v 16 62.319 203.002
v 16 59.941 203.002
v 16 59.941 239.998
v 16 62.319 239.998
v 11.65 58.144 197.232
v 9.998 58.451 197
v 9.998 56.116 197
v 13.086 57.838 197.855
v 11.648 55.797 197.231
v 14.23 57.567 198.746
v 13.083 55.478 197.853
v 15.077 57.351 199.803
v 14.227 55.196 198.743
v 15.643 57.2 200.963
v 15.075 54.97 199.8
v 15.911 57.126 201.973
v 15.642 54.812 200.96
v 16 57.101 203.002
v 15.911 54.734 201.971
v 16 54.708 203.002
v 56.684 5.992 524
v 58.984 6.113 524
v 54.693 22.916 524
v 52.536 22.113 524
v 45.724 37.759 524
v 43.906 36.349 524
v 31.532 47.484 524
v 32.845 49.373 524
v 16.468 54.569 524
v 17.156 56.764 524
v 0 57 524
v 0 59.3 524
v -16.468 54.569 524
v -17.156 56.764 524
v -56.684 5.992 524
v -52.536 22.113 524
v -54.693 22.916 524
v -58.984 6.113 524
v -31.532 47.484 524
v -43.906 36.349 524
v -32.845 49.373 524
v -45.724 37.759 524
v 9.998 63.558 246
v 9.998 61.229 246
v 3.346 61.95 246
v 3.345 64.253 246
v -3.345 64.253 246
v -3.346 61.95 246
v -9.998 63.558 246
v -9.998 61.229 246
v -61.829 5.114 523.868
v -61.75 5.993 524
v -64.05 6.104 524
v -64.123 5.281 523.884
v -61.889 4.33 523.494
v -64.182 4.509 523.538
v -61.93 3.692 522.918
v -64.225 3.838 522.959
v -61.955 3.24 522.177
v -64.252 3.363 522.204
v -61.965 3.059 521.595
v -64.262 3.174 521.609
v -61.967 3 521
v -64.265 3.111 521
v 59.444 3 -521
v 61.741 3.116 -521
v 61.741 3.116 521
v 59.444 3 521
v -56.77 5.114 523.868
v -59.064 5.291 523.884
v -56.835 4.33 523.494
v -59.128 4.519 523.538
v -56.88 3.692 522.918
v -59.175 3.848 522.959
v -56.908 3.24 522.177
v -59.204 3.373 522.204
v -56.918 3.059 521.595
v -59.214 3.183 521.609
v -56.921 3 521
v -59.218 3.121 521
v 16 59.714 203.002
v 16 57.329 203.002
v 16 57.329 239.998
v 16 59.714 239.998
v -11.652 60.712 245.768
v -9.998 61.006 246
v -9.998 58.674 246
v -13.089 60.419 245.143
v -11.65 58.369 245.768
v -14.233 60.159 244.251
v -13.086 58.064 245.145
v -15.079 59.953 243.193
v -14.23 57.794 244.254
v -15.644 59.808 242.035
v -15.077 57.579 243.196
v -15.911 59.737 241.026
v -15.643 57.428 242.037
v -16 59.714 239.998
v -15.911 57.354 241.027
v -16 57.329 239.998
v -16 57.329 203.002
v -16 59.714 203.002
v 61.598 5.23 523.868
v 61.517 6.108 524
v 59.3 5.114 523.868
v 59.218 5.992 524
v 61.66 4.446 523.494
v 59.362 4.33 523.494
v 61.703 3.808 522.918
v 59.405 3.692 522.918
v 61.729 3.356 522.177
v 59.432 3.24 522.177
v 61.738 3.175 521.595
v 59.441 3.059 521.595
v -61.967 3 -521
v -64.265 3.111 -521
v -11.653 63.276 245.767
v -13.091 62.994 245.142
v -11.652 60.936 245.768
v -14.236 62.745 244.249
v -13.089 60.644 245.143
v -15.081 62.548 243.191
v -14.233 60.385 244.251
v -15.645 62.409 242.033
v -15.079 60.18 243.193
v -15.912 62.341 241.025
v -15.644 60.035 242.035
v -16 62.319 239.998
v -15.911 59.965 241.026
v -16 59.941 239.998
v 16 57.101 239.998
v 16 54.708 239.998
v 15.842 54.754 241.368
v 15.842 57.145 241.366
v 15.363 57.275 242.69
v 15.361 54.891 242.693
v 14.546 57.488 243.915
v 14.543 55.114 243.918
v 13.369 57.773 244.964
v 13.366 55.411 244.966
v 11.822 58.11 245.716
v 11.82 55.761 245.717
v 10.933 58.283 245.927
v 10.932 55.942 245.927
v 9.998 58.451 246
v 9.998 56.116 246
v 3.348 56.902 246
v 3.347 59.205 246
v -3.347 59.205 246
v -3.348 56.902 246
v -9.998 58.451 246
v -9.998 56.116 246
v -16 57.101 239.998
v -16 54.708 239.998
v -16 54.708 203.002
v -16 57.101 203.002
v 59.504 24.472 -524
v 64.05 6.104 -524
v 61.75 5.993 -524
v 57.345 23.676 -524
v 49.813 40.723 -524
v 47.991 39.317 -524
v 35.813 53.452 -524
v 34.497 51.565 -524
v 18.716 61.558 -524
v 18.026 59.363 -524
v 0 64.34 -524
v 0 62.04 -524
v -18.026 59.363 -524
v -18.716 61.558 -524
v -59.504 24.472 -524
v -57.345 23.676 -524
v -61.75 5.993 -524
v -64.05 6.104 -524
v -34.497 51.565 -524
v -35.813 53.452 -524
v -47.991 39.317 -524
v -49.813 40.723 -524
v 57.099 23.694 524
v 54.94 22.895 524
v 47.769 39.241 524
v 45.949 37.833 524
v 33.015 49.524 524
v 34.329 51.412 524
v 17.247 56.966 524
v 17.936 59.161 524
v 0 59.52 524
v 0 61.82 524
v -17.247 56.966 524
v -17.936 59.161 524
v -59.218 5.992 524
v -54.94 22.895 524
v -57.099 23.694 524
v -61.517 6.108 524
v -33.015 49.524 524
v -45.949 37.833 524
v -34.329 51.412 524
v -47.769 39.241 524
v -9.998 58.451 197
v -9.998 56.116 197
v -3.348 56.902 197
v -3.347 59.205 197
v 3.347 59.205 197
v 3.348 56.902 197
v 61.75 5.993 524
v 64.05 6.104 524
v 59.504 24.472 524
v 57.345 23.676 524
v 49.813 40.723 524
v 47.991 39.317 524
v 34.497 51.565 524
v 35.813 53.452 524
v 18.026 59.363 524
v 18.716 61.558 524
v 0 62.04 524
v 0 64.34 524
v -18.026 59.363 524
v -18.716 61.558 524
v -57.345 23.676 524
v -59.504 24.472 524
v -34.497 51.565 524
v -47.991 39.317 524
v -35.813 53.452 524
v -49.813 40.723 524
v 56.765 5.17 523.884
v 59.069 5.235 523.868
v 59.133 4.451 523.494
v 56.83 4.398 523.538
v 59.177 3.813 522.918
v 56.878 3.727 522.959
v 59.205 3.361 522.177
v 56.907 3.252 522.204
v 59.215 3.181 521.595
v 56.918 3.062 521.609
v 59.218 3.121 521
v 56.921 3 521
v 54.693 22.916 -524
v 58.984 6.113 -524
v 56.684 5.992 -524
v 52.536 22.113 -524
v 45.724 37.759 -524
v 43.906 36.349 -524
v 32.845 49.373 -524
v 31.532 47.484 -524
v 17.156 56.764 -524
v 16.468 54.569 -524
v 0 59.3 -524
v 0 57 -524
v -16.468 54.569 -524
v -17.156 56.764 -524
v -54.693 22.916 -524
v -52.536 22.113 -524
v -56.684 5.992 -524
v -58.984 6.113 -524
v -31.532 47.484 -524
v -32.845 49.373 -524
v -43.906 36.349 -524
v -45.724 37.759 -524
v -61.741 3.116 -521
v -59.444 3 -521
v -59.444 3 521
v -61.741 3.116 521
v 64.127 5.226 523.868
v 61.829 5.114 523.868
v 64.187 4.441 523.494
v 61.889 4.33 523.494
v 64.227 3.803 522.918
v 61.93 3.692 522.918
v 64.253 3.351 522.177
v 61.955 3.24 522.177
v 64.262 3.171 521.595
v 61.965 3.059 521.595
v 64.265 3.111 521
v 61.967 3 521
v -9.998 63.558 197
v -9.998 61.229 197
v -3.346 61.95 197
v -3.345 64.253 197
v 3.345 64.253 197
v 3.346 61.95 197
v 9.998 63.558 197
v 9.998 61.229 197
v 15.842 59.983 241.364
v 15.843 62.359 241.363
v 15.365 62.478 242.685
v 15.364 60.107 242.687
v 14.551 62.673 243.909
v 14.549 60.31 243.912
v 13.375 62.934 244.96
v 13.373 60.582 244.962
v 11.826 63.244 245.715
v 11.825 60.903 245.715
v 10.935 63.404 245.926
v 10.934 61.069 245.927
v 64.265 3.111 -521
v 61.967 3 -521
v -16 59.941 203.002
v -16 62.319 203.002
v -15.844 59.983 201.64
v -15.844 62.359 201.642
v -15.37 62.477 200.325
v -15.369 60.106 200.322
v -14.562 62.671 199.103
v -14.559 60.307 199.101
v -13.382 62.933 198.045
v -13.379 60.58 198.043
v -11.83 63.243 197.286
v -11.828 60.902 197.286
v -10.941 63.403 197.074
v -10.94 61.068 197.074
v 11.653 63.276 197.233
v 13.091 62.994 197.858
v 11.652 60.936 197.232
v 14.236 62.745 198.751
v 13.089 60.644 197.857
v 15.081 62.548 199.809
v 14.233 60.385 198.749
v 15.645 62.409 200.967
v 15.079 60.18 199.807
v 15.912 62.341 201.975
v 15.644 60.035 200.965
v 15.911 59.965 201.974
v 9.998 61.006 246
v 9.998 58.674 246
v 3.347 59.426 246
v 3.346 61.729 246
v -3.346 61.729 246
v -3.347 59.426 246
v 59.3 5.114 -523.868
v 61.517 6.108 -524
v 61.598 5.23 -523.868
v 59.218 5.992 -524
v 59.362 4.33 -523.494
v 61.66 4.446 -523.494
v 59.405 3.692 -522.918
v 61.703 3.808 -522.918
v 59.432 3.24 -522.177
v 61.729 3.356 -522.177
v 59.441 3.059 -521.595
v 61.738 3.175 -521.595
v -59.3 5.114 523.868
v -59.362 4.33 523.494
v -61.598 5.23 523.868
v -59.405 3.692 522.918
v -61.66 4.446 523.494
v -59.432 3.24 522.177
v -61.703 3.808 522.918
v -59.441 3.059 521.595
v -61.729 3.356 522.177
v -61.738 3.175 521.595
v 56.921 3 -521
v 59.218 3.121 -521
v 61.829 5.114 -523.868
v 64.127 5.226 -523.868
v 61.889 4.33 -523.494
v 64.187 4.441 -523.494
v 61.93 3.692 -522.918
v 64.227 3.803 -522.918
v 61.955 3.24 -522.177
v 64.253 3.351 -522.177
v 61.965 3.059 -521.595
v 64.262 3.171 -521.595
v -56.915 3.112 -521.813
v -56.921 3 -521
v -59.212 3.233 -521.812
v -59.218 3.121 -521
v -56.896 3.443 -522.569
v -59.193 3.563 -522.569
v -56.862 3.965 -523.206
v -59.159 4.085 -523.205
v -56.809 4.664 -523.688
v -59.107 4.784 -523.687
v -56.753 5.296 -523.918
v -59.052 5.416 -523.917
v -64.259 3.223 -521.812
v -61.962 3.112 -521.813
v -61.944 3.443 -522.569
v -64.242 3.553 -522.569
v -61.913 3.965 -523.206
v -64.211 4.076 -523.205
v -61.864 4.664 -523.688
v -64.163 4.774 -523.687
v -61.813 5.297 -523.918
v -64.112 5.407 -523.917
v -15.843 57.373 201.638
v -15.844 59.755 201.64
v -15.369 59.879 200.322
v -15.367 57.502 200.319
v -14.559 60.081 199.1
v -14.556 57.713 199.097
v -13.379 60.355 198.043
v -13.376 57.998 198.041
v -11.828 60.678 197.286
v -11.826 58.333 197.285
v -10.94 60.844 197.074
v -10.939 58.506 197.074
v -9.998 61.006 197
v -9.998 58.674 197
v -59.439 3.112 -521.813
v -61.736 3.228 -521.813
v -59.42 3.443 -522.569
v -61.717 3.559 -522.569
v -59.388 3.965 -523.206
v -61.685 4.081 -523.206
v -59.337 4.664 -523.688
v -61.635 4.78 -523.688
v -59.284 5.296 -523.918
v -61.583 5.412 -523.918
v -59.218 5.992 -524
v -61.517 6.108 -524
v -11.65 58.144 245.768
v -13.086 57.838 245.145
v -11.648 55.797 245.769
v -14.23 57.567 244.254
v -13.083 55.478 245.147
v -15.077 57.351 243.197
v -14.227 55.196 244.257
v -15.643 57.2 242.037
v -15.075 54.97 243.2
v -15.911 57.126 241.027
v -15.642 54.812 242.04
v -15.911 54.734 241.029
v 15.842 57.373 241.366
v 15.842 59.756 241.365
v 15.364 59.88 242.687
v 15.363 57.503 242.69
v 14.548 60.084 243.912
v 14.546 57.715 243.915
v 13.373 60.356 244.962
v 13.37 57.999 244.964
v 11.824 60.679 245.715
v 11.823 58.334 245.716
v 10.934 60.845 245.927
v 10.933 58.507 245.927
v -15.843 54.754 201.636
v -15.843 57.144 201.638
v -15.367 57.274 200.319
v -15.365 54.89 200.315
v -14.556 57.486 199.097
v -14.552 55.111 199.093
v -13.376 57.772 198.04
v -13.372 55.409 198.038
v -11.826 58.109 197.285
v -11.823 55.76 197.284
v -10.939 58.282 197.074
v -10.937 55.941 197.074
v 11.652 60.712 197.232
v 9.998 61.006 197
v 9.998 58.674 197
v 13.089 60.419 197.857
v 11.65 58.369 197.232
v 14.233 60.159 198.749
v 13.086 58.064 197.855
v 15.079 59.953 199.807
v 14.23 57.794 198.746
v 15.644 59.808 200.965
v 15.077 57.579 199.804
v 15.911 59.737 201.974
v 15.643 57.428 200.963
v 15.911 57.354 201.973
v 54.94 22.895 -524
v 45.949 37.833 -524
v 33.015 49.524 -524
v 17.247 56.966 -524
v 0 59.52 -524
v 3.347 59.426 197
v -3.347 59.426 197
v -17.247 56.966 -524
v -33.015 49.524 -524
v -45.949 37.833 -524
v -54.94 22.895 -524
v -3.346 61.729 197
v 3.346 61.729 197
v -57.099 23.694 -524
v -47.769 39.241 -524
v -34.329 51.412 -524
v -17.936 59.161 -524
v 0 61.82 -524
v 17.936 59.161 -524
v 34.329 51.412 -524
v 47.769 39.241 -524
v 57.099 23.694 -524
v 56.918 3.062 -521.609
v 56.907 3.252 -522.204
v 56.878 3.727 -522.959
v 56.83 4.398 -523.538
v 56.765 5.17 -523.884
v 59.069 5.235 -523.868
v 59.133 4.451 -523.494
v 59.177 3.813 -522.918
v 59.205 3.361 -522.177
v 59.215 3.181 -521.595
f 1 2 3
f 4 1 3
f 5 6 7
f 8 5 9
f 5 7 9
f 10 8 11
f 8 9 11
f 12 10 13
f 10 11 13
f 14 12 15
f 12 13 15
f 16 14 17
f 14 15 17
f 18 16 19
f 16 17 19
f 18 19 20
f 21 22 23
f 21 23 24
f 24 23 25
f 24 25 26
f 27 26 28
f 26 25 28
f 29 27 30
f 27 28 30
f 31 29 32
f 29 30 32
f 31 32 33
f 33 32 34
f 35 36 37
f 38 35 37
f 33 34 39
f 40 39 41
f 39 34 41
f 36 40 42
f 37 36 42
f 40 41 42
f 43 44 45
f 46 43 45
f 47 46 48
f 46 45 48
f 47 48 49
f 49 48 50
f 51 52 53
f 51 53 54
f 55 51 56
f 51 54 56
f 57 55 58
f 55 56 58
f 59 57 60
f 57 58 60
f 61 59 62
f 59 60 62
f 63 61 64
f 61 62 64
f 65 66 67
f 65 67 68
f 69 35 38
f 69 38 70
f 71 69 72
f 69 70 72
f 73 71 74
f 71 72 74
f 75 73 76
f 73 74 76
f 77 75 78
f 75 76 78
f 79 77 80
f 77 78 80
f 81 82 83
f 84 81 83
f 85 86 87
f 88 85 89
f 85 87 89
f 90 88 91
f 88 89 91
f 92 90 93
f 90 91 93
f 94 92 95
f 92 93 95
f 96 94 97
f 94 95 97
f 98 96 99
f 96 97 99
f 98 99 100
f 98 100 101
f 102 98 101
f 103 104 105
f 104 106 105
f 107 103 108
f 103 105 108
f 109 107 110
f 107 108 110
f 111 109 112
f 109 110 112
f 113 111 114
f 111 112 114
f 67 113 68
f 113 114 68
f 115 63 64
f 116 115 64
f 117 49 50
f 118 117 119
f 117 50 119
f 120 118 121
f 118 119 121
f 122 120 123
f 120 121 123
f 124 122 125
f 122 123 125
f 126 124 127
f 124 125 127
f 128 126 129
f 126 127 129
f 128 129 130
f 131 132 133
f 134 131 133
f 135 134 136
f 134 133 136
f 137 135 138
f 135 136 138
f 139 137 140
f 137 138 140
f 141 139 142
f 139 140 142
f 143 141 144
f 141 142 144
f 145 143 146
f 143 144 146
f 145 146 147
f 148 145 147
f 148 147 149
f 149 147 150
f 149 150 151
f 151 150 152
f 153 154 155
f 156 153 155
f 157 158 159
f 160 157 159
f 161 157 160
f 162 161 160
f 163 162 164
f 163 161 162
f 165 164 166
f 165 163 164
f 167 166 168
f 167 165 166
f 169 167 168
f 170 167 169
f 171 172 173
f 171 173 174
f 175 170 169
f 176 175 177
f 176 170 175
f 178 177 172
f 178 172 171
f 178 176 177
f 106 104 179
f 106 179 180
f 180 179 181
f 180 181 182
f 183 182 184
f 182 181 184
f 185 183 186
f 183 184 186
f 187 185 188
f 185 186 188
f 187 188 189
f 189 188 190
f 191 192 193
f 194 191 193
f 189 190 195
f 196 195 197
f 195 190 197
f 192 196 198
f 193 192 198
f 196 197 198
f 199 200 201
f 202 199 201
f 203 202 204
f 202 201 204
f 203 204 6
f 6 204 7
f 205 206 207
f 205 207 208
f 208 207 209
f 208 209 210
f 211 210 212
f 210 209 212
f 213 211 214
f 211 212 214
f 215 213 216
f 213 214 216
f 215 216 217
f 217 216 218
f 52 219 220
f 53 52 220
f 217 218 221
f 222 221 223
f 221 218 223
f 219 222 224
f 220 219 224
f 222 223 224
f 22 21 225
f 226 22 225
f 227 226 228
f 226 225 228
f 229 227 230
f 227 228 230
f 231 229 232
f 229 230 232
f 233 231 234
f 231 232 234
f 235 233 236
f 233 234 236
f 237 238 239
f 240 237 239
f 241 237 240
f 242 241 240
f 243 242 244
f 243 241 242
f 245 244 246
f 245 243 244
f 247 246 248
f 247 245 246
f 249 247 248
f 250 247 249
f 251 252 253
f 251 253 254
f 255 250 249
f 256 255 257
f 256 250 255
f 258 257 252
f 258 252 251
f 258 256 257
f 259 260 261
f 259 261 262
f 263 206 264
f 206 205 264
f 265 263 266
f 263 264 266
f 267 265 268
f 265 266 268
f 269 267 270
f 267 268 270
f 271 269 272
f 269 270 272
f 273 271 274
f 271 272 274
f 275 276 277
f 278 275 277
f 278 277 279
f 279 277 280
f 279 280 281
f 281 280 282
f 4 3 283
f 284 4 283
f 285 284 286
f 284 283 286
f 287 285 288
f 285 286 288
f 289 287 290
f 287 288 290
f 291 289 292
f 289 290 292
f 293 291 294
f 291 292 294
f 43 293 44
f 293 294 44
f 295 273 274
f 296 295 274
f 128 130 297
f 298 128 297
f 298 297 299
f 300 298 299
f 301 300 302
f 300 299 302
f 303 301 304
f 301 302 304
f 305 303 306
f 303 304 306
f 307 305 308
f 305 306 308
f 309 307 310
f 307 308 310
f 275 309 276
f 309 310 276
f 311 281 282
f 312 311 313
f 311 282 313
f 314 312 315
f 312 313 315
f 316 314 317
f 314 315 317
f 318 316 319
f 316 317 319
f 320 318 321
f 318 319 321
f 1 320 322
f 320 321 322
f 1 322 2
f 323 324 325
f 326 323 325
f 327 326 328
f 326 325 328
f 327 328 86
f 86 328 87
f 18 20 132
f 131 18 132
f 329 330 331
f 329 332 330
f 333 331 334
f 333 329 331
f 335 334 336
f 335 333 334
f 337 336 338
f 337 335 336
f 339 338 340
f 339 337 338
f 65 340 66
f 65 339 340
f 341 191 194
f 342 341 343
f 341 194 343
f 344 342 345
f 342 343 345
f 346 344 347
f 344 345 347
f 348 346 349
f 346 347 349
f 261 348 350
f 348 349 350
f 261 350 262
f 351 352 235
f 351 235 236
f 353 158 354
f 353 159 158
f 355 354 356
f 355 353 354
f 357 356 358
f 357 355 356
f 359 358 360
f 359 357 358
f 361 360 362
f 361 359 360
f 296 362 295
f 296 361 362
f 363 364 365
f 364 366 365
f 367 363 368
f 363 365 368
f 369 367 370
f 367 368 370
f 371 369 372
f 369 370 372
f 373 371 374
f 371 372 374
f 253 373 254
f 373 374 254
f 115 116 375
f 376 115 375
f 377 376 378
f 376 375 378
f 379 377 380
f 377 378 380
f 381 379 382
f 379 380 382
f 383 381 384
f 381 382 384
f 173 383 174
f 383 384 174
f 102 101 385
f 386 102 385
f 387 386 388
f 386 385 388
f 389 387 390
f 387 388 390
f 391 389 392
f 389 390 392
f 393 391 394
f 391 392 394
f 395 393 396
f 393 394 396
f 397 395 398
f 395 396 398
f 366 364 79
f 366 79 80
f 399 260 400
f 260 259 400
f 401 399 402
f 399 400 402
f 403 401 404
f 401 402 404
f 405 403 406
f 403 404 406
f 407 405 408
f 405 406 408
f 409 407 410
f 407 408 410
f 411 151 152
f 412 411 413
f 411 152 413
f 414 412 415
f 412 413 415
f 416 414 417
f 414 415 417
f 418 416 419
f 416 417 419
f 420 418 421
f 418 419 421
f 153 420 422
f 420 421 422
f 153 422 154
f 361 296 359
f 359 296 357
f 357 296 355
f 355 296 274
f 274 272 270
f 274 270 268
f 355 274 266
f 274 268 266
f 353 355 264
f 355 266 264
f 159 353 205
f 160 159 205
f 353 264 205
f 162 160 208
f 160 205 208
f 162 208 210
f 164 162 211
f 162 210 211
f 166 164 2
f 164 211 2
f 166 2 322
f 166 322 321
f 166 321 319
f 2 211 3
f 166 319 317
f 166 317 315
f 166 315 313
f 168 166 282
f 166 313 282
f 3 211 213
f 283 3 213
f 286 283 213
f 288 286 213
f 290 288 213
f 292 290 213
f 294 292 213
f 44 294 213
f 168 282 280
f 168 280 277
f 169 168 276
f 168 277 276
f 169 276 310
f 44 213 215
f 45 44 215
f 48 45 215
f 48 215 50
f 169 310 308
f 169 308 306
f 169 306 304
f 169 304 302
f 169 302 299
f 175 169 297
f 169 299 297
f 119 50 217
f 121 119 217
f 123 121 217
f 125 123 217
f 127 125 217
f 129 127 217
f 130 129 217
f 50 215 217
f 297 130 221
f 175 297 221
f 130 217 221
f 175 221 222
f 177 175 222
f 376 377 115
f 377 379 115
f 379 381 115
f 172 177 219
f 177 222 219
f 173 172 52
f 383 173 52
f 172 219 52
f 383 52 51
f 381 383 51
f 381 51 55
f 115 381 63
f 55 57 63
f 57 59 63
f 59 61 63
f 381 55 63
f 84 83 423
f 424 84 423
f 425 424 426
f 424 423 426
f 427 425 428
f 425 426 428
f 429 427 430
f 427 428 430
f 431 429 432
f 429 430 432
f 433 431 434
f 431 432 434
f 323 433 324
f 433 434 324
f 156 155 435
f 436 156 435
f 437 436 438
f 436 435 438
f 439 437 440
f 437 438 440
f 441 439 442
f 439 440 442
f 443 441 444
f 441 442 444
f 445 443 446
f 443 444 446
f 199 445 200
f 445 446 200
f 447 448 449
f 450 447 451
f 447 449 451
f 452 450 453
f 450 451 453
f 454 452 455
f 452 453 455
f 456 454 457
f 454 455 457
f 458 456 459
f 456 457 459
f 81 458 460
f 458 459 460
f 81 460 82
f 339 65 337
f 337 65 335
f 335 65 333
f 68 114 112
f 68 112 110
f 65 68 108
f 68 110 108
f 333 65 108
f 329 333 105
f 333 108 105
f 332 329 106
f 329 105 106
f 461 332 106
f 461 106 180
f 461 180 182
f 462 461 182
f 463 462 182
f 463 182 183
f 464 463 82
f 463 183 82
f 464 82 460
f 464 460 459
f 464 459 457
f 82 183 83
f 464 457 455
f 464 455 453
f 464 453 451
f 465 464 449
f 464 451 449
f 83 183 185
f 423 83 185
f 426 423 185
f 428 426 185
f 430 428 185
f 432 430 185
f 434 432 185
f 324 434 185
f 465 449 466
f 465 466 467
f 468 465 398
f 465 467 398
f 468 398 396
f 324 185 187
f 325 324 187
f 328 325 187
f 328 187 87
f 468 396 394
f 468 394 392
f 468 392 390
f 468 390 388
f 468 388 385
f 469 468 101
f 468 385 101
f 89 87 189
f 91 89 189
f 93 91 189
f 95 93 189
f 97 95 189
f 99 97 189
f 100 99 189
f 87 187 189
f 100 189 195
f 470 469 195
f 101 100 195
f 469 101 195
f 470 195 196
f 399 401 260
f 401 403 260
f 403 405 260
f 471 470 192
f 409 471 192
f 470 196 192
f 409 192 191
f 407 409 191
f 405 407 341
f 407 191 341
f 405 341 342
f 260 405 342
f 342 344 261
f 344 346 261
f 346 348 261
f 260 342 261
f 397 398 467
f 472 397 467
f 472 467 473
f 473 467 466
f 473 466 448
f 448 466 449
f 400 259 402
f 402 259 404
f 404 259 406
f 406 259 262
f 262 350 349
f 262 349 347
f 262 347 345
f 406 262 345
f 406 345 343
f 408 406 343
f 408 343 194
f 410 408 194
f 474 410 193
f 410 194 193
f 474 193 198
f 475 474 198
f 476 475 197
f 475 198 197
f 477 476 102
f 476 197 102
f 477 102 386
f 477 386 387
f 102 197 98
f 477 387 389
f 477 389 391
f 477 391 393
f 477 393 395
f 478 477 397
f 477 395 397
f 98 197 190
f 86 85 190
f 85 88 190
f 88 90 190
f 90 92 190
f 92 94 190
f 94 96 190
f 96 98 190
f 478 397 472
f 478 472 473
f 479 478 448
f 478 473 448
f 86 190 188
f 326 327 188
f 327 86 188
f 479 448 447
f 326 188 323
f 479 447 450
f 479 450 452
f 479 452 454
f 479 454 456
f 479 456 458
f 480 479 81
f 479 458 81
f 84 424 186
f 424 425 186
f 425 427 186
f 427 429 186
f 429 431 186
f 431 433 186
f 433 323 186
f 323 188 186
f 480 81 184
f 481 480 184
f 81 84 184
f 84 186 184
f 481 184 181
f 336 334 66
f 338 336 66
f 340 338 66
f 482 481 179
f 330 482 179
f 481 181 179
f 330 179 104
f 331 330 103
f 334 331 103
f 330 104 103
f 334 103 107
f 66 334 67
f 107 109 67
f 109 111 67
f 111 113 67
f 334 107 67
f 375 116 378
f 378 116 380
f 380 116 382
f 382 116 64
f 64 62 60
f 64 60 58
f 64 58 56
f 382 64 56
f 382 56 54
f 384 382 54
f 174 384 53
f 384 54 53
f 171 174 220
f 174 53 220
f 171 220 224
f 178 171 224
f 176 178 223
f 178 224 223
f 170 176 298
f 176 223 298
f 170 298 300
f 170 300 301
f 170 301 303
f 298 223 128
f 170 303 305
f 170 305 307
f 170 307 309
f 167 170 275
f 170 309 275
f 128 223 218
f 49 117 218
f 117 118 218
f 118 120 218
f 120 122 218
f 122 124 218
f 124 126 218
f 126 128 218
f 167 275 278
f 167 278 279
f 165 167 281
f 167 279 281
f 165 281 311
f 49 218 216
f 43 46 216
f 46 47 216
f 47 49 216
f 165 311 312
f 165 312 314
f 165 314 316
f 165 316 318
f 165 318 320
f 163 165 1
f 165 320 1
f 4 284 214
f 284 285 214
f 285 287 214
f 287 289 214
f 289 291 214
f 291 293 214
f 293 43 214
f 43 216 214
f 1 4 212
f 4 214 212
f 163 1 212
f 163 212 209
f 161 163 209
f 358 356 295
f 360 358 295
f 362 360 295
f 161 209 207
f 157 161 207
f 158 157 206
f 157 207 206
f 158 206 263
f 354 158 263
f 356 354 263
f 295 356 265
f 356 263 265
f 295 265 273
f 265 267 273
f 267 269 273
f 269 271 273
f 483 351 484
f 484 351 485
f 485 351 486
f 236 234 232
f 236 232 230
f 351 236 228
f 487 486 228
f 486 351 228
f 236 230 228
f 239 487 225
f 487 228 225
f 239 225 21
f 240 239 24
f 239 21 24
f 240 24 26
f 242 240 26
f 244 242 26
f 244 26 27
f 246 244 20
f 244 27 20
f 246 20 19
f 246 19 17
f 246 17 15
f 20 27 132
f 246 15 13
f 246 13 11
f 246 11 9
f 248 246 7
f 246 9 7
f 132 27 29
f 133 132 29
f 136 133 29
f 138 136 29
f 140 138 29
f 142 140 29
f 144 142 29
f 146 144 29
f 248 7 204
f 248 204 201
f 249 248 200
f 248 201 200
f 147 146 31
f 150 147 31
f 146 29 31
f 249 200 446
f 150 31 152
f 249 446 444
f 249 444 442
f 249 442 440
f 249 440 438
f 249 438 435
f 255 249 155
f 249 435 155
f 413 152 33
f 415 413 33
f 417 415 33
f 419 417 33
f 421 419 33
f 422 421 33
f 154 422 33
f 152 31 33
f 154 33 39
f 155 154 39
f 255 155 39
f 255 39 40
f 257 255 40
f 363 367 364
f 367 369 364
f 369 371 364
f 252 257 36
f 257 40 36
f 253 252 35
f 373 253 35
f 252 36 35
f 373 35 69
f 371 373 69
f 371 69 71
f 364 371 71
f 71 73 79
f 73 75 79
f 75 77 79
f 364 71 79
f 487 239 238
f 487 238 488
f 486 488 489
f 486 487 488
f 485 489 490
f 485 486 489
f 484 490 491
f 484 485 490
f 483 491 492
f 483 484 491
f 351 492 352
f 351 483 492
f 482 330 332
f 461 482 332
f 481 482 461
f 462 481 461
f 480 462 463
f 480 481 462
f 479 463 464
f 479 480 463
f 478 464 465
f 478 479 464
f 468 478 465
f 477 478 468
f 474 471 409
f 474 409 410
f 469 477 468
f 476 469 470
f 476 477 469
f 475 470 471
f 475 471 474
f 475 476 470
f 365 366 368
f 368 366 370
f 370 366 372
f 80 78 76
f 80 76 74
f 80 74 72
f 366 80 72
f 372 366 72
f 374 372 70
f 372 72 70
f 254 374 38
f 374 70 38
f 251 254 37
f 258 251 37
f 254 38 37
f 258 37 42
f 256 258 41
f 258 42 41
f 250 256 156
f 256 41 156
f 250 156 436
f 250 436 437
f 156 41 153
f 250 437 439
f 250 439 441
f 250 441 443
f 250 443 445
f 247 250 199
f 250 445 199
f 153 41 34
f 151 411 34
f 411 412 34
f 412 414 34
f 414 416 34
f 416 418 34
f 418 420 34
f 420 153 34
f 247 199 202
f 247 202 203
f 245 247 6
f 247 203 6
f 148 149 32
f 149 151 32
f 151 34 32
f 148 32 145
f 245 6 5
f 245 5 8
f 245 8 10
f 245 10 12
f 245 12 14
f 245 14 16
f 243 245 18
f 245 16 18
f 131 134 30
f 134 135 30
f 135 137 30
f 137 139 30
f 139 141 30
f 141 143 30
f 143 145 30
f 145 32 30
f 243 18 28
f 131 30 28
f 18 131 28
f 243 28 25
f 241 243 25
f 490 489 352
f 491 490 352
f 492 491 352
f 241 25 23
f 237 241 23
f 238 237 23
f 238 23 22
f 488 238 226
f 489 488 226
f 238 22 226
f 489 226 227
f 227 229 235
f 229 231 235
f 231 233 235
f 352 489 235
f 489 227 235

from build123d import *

# Parameters (mm, degrees)
EXTRUDE_THIN1_DEPTH = 524
EXTRUDE_THIN2_DEPTH = 524
EXTRUDE_THIN3_DEPTH = 524
FILLET1_R           = 3
FILLET2_R           = 3
FILLET3_R           = 3
CUT_EXTRUDE1_DEPTH  = 65.3400001


with BuildPart() as part:
    # Sketch1 → Extrude-Thin1 (new body, symmetric)
    with BuildSketch(Plane.XY):
        with BuildLine():
            ThreePointArc((56.920997883, 3), (0, 57), (-56.920997883, 3))
            Line((-56.920997883, 3), (-59.217810078, 3.121052632))
            ThreePointArc((-59.217810078, 3.121052632), (0, 59.3), (59.217810078, 3.121052632))
            Line((59.217810078, 3.121052632), (56.920997883, 3))
        make_face()
    extrude(amount=EXTRUDE_THIN1_DEPTH, both=True)

    # Fillet3
    fillet3_edges = [part.edges().sort_by_distance(p)[0] for p in [
        (58.069403981, 3.060526316, 524),
        (58.069403981, 3.060526316, -524),
        (-58.069403981, 3.060526316, -524),
        (-58.069403981, 3.060526316, 524),
    ]]
    fillet(fillet3_edges, radius=FILLET3_R)


with BuildPart() as body_2:
    # Sketch2 → Extrude-Thin2 (new body, symmetric)
    with BuildSketch(Plane.XY):
        with BuildLine():
            ThreePointArc((59.444347082, 3), (0, 59.52), (-59.444347082, 3))
            Line((-59.444347082, 3), (-61.741423666, 3.115927419))
            ThreePointArc((-61.741423666, 3.115927419), (0, 61.82), (61.741423666, 3.115927419))
            Line((61.741423666, 3.115927419), (59.444347082, 3))
        make_face()
    extrude(amount=EXTRUDE_THIN2_DEPTH, both=True)

    # Fillet2
    fillet2_edges = [body_2.edges().sort_by_distance(p)[0] for p in [
        (60.592885374, 3.05796371, 524),
        (60.592885374, 3.05796371, -524),
        (-60.592885374, 3.05796371, -524),
        (-60.592885374, 3.05796371, 524),
    ]]
    fillet(fillet2_edges, radius=FILLET2_R)


with BuildPart() as body_3:
    # Sketch3 → Extrude-Thin3 (new body, symmetric)
    with BuildSketch(Plane.XY):
        with BuildLine():
            ThreePointArc((61.9674237, 3), (0, 62.04), (-61.9674237, 3))
            Line((-61.9674237, 3), (-64.264733089, 3.111218569))
            ThreePointArc((-64.264733089, 3.111218569), (0, 64.34), (64.264733089, 3.111218569))
            Line((64.264733089, 3.111218569), (61.9674237, 3))
        make_face()
    extrude(amount=EXTRUDE_THIN3_DEPTH, both=True)

    # Fillet1
    fillet1_edges = [body_3.edges().sort_by_distance(p)[0] for p in [
        (63.116078395, 3.055609284, 524),
        (63.116078395, 3.055609284, -524),
        (-63.116078395, 3.055609284, -524),
        (-63.116078395, 3.055609284, 524),
    ]]
    fillet(fillet1_edges, radius=FILLET1_R)


with BuildPart() as cut_extrude1_tool:
    # Sketch4 → Cut-Extrude1 (new body, through all)
    with BuildSketch(Plane(origin=(0, 0, 0), x_dir=(1, 0, 0), z_dir=(0, 1, 0))):
        with BuildLine():
            Line((9.998413649, -246), (-9.998413649, -246))
            ThreePointArc((-9.998413649, -246), (-14.242176056, -244.242176056), (-16, -239.998413649))
            Line((-16, -239.998413649), (-16, -203.001586351))
            ThreePointArc((-16, -203.001586351), (-14.242176056, -198.757823944), (-9.998413649, -197))
            Line((-9.998413649, -197), (9.998413649, -197))
            ThreePointArc((9.998413649, -197), (14.242176056, -198.757823944), (16, -203.001586351))
            Line((16, -203.001586351), (16, -239.998413649))
            ThreePointArc((16, -239.998413649), (14.242176056, -244.242176056), (9.998413649, -246))
        make_face()
    extrude(amount=CUT_EXTRUDE1_DEPTH)


with BuildPart() as part_1:
    add(part.part)

    # Cut-Extrude1: cut by cut_extrude1_tool
    add(cut_extrude1_tool.part, mode=Mode.SUBTRACT)


with BuildPart() as body_2_1:
    add(body_2.part)

    # Cut-Extrude1: cut by cut_extrude1_tool
    add(cut_extrude1_tool.part, mode=Mode.SUBTRACT)


with BuildPart() as body_3_1:
    add(body_3.part)

    # Cut-Extrude1: cut by cut_extrude1_tool
    add(cut_extrude1_tool.part, mode=Mode.SUBTRACT)


solid = Compound([part_1.part, body_2_1.part, body_3_1.part])
